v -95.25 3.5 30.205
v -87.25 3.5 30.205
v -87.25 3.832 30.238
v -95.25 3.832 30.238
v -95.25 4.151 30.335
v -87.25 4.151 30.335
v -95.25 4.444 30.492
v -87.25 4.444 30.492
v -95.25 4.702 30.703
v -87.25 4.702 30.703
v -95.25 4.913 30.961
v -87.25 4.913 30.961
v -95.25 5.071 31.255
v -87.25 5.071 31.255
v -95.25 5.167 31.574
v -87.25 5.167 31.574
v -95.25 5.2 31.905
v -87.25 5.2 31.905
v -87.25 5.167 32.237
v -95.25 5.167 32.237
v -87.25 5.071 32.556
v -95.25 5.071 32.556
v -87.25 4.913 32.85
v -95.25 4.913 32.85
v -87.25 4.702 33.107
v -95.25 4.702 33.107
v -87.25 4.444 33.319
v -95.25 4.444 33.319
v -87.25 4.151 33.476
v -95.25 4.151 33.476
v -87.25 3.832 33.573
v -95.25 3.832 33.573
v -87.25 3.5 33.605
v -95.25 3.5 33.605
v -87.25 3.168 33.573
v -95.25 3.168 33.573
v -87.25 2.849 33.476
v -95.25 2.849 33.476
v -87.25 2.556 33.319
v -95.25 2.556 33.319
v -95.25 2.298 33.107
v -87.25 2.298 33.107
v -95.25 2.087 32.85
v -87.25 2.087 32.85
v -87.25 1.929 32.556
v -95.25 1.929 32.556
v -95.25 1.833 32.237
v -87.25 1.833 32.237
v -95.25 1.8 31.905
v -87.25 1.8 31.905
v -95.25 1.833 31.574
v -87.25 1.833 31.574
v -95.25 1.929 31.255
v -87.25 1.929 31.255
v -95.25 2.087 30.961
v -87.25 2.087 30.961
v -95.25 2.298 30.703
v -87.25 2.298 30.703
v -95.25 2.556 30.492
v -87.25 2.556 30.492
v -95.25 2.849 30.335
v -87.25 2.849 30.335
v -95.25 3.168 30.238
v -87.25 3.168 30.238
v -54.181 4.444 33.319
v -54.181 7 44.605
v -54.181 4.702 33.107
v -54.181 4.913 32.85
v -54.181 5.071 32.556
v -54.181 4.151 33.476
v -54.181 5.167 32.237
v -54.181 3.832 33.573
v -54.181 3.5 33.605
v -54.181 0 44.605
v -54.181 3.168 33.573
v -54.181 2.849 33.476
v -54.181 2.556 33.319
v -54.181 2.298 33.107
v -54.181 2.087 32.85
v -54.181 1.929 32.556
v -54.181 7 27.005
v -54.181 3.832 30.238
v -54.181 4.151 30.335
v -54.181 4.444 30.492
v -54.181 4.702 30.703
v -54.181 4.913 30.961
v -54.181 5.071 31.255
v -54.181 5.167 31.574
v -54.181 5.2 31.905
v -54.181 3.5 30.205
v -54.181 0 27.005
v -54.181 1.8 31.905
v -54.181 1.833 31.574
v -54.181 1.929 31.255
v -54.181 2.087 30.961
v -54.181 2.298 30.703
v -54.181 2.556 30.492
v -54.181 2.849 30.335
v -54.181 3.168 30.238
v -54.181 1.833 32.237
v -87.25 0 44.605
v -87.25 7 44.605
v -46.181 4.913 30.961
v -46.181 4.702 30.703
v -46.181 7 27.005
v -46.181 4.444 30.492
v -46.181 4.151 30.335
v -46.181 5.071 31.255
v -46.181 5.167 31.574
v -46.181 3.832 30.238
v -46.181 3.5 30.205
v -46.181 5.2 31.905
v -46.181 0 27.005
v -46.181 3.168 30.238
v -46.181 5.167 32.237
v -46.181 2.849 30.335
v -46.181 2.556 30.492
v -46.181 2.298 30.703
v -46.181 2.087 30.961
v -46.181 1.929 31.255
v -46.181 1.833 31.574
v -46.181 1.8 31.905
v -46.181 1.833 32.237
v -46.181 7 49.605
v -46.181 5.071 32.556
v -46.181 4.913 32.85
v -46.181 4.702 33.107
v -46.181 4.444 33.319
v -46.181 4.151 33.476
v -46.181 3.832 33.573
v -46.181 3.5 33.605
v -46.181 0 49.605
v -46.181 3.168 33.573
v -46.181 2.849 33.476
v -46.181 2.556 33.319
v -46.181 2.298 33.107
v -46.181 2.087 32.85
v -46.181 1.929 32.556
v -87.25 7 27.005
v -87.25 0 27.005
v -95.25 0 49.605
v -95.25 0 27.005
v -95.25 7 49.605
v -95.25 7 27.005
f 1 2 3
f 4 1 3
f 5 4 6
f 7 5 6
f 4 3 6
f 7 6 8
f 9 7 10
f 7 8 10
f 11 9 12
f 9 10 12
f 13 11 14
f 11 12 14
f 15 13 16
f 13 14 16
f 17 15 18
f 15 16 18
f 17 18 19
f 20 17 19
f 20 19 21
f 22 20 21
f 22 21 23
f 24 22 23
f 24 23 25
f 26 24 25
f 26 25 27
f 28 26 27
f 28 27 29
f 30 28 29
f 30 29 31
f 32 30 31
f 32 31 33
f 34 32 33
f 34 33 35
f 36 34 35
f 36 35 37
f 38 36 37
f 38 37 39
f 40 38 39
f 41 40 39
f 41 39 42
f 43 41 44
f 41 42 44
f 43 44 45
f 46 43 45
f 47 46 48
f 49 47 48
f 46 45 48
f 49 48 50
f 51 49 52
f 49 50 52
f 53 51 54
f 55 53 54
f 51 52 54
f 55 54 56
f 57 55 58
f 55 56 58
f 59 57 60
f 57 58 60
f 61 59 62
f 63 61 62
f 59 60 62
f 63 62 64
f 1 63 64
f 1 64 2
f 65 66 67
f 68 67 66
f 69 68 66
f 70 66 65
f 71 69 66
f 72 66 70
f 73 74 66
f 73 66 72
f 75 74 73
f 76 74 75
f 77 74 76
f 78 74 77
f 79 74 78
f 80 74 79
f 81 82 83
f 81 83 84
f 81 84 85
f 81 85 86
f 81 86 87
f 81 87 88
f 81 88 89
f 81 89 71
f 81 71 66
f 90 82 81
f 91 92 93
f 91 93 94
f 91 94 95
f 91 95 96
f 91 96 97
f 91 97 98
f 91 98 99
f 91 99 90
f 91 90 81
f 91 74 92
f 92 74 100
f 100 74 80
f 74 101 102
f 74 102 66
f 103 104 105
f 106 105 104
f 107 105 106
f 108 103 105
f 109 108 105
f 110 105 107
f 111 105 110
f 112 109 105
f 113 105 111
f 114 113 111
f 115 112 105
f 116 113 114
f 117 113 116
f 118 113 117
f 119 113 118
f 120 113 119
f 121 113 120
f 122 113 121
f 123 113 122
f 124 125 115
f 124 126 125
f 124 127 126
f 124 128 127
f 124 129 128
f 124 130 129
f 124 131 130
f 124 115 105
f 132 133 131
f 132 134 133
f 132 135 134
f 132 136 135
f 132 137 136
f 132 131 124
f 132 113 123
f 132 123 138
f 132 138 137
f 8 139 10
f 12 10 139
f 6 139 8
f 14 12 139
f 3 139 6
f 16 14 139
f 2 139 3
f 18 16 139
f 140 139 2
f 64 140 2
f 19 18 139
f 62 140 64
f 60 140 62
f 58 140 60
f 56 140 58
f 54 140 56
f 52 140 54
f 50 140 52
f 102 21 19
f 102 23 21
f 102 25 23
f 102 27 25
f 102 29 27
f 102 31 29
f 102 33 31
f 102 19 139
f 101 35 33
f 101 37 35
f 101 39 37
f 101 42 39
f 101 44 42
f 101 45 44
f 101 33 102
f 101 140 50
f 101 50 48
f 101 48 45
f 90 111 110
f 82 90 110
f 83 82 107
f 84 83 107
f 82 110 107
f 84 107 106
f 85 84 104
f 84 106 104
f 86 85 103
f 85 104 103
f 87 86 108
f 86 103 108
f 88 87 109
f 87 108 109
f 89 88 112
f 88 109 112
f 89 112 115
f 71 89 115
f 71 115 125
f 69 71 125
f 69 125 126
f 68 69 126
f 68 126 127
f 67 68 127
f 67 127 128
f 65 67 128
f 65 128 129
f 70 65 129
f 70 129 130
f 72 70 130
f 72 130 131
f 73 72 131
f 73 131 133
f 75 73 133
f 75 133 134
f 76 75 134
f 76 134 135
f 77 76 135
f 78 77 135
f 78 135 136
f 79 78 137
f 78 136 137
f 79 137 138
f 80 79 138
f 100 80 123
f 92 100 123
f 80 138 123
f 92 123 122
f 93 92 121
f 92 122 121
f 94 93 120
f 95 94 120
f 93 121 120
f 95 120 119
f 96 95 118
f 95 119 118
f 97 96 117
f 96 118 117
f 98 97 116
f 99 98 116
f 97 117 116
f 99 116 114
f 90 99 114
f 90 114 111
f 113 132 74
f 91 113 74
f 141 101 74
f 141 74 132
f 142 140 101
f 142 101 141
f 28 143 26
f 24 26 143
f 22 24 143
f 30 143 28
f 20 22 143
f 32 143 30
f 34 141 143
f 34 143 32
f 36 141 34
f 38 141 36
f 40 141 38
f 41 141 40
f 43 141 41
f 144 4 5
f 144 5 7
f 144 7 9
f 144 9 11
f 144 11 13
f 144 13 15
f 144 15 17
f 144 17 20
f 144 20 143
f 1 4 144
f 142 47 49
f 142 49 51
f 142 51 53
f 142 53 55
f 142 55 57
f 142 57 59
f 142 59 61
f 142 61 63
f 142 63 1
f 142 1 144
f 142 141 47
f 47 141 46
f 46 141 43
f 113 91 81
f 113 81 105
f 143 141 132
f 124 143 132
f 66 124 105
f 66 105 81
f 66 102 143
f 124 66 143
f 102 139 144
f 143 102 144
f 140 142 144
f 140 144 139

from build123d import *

# Parameters (mm, degrees)
BOSS_EXTRUDE1_DEPTH = 7
SKETCH3_R           = 1.7
CUT_EXTRUDE2_DEPTH  = 60


with BuildPart() as part:
    # Sketch1 → Boss-Extrude1 (new body)
    with BuildSketch(Plane(origin=(0, 0, 0), x_dir=(1, 0, 0), z_dir=(0, 1, 0))):
        Polygon((-87.25, -27.005178012), (-87.25, -44.605178012), (-54.181, -44.605178012), (-54.181, -27.005178012), (-46.181, -27.005178012), (-46.181, -49.605178012), (-64.006, -49.605178012), (-77.425, -49.605178012), (-95.25, -49.605178012), (-95.25, -27.005178012), align=None)
    extrude(amount=BOSS_EXTRUDE1_DEPTH)

    # Sketch3 → Cut-Extrude2 (cut)
    with BuildSketch(Plane(origin=(-46.181, 0, 0), x_dir=(0, 0, -1), z_dir=(1, 0, 0))):
        with Locations((-31.905178012, 3.5)):
            Circle(SKETCH3_R)
    extrude(amount=-CUT_EXTRUDE2_DEPTH, mode=Mode.SUBTRACT)


solid = part.part
